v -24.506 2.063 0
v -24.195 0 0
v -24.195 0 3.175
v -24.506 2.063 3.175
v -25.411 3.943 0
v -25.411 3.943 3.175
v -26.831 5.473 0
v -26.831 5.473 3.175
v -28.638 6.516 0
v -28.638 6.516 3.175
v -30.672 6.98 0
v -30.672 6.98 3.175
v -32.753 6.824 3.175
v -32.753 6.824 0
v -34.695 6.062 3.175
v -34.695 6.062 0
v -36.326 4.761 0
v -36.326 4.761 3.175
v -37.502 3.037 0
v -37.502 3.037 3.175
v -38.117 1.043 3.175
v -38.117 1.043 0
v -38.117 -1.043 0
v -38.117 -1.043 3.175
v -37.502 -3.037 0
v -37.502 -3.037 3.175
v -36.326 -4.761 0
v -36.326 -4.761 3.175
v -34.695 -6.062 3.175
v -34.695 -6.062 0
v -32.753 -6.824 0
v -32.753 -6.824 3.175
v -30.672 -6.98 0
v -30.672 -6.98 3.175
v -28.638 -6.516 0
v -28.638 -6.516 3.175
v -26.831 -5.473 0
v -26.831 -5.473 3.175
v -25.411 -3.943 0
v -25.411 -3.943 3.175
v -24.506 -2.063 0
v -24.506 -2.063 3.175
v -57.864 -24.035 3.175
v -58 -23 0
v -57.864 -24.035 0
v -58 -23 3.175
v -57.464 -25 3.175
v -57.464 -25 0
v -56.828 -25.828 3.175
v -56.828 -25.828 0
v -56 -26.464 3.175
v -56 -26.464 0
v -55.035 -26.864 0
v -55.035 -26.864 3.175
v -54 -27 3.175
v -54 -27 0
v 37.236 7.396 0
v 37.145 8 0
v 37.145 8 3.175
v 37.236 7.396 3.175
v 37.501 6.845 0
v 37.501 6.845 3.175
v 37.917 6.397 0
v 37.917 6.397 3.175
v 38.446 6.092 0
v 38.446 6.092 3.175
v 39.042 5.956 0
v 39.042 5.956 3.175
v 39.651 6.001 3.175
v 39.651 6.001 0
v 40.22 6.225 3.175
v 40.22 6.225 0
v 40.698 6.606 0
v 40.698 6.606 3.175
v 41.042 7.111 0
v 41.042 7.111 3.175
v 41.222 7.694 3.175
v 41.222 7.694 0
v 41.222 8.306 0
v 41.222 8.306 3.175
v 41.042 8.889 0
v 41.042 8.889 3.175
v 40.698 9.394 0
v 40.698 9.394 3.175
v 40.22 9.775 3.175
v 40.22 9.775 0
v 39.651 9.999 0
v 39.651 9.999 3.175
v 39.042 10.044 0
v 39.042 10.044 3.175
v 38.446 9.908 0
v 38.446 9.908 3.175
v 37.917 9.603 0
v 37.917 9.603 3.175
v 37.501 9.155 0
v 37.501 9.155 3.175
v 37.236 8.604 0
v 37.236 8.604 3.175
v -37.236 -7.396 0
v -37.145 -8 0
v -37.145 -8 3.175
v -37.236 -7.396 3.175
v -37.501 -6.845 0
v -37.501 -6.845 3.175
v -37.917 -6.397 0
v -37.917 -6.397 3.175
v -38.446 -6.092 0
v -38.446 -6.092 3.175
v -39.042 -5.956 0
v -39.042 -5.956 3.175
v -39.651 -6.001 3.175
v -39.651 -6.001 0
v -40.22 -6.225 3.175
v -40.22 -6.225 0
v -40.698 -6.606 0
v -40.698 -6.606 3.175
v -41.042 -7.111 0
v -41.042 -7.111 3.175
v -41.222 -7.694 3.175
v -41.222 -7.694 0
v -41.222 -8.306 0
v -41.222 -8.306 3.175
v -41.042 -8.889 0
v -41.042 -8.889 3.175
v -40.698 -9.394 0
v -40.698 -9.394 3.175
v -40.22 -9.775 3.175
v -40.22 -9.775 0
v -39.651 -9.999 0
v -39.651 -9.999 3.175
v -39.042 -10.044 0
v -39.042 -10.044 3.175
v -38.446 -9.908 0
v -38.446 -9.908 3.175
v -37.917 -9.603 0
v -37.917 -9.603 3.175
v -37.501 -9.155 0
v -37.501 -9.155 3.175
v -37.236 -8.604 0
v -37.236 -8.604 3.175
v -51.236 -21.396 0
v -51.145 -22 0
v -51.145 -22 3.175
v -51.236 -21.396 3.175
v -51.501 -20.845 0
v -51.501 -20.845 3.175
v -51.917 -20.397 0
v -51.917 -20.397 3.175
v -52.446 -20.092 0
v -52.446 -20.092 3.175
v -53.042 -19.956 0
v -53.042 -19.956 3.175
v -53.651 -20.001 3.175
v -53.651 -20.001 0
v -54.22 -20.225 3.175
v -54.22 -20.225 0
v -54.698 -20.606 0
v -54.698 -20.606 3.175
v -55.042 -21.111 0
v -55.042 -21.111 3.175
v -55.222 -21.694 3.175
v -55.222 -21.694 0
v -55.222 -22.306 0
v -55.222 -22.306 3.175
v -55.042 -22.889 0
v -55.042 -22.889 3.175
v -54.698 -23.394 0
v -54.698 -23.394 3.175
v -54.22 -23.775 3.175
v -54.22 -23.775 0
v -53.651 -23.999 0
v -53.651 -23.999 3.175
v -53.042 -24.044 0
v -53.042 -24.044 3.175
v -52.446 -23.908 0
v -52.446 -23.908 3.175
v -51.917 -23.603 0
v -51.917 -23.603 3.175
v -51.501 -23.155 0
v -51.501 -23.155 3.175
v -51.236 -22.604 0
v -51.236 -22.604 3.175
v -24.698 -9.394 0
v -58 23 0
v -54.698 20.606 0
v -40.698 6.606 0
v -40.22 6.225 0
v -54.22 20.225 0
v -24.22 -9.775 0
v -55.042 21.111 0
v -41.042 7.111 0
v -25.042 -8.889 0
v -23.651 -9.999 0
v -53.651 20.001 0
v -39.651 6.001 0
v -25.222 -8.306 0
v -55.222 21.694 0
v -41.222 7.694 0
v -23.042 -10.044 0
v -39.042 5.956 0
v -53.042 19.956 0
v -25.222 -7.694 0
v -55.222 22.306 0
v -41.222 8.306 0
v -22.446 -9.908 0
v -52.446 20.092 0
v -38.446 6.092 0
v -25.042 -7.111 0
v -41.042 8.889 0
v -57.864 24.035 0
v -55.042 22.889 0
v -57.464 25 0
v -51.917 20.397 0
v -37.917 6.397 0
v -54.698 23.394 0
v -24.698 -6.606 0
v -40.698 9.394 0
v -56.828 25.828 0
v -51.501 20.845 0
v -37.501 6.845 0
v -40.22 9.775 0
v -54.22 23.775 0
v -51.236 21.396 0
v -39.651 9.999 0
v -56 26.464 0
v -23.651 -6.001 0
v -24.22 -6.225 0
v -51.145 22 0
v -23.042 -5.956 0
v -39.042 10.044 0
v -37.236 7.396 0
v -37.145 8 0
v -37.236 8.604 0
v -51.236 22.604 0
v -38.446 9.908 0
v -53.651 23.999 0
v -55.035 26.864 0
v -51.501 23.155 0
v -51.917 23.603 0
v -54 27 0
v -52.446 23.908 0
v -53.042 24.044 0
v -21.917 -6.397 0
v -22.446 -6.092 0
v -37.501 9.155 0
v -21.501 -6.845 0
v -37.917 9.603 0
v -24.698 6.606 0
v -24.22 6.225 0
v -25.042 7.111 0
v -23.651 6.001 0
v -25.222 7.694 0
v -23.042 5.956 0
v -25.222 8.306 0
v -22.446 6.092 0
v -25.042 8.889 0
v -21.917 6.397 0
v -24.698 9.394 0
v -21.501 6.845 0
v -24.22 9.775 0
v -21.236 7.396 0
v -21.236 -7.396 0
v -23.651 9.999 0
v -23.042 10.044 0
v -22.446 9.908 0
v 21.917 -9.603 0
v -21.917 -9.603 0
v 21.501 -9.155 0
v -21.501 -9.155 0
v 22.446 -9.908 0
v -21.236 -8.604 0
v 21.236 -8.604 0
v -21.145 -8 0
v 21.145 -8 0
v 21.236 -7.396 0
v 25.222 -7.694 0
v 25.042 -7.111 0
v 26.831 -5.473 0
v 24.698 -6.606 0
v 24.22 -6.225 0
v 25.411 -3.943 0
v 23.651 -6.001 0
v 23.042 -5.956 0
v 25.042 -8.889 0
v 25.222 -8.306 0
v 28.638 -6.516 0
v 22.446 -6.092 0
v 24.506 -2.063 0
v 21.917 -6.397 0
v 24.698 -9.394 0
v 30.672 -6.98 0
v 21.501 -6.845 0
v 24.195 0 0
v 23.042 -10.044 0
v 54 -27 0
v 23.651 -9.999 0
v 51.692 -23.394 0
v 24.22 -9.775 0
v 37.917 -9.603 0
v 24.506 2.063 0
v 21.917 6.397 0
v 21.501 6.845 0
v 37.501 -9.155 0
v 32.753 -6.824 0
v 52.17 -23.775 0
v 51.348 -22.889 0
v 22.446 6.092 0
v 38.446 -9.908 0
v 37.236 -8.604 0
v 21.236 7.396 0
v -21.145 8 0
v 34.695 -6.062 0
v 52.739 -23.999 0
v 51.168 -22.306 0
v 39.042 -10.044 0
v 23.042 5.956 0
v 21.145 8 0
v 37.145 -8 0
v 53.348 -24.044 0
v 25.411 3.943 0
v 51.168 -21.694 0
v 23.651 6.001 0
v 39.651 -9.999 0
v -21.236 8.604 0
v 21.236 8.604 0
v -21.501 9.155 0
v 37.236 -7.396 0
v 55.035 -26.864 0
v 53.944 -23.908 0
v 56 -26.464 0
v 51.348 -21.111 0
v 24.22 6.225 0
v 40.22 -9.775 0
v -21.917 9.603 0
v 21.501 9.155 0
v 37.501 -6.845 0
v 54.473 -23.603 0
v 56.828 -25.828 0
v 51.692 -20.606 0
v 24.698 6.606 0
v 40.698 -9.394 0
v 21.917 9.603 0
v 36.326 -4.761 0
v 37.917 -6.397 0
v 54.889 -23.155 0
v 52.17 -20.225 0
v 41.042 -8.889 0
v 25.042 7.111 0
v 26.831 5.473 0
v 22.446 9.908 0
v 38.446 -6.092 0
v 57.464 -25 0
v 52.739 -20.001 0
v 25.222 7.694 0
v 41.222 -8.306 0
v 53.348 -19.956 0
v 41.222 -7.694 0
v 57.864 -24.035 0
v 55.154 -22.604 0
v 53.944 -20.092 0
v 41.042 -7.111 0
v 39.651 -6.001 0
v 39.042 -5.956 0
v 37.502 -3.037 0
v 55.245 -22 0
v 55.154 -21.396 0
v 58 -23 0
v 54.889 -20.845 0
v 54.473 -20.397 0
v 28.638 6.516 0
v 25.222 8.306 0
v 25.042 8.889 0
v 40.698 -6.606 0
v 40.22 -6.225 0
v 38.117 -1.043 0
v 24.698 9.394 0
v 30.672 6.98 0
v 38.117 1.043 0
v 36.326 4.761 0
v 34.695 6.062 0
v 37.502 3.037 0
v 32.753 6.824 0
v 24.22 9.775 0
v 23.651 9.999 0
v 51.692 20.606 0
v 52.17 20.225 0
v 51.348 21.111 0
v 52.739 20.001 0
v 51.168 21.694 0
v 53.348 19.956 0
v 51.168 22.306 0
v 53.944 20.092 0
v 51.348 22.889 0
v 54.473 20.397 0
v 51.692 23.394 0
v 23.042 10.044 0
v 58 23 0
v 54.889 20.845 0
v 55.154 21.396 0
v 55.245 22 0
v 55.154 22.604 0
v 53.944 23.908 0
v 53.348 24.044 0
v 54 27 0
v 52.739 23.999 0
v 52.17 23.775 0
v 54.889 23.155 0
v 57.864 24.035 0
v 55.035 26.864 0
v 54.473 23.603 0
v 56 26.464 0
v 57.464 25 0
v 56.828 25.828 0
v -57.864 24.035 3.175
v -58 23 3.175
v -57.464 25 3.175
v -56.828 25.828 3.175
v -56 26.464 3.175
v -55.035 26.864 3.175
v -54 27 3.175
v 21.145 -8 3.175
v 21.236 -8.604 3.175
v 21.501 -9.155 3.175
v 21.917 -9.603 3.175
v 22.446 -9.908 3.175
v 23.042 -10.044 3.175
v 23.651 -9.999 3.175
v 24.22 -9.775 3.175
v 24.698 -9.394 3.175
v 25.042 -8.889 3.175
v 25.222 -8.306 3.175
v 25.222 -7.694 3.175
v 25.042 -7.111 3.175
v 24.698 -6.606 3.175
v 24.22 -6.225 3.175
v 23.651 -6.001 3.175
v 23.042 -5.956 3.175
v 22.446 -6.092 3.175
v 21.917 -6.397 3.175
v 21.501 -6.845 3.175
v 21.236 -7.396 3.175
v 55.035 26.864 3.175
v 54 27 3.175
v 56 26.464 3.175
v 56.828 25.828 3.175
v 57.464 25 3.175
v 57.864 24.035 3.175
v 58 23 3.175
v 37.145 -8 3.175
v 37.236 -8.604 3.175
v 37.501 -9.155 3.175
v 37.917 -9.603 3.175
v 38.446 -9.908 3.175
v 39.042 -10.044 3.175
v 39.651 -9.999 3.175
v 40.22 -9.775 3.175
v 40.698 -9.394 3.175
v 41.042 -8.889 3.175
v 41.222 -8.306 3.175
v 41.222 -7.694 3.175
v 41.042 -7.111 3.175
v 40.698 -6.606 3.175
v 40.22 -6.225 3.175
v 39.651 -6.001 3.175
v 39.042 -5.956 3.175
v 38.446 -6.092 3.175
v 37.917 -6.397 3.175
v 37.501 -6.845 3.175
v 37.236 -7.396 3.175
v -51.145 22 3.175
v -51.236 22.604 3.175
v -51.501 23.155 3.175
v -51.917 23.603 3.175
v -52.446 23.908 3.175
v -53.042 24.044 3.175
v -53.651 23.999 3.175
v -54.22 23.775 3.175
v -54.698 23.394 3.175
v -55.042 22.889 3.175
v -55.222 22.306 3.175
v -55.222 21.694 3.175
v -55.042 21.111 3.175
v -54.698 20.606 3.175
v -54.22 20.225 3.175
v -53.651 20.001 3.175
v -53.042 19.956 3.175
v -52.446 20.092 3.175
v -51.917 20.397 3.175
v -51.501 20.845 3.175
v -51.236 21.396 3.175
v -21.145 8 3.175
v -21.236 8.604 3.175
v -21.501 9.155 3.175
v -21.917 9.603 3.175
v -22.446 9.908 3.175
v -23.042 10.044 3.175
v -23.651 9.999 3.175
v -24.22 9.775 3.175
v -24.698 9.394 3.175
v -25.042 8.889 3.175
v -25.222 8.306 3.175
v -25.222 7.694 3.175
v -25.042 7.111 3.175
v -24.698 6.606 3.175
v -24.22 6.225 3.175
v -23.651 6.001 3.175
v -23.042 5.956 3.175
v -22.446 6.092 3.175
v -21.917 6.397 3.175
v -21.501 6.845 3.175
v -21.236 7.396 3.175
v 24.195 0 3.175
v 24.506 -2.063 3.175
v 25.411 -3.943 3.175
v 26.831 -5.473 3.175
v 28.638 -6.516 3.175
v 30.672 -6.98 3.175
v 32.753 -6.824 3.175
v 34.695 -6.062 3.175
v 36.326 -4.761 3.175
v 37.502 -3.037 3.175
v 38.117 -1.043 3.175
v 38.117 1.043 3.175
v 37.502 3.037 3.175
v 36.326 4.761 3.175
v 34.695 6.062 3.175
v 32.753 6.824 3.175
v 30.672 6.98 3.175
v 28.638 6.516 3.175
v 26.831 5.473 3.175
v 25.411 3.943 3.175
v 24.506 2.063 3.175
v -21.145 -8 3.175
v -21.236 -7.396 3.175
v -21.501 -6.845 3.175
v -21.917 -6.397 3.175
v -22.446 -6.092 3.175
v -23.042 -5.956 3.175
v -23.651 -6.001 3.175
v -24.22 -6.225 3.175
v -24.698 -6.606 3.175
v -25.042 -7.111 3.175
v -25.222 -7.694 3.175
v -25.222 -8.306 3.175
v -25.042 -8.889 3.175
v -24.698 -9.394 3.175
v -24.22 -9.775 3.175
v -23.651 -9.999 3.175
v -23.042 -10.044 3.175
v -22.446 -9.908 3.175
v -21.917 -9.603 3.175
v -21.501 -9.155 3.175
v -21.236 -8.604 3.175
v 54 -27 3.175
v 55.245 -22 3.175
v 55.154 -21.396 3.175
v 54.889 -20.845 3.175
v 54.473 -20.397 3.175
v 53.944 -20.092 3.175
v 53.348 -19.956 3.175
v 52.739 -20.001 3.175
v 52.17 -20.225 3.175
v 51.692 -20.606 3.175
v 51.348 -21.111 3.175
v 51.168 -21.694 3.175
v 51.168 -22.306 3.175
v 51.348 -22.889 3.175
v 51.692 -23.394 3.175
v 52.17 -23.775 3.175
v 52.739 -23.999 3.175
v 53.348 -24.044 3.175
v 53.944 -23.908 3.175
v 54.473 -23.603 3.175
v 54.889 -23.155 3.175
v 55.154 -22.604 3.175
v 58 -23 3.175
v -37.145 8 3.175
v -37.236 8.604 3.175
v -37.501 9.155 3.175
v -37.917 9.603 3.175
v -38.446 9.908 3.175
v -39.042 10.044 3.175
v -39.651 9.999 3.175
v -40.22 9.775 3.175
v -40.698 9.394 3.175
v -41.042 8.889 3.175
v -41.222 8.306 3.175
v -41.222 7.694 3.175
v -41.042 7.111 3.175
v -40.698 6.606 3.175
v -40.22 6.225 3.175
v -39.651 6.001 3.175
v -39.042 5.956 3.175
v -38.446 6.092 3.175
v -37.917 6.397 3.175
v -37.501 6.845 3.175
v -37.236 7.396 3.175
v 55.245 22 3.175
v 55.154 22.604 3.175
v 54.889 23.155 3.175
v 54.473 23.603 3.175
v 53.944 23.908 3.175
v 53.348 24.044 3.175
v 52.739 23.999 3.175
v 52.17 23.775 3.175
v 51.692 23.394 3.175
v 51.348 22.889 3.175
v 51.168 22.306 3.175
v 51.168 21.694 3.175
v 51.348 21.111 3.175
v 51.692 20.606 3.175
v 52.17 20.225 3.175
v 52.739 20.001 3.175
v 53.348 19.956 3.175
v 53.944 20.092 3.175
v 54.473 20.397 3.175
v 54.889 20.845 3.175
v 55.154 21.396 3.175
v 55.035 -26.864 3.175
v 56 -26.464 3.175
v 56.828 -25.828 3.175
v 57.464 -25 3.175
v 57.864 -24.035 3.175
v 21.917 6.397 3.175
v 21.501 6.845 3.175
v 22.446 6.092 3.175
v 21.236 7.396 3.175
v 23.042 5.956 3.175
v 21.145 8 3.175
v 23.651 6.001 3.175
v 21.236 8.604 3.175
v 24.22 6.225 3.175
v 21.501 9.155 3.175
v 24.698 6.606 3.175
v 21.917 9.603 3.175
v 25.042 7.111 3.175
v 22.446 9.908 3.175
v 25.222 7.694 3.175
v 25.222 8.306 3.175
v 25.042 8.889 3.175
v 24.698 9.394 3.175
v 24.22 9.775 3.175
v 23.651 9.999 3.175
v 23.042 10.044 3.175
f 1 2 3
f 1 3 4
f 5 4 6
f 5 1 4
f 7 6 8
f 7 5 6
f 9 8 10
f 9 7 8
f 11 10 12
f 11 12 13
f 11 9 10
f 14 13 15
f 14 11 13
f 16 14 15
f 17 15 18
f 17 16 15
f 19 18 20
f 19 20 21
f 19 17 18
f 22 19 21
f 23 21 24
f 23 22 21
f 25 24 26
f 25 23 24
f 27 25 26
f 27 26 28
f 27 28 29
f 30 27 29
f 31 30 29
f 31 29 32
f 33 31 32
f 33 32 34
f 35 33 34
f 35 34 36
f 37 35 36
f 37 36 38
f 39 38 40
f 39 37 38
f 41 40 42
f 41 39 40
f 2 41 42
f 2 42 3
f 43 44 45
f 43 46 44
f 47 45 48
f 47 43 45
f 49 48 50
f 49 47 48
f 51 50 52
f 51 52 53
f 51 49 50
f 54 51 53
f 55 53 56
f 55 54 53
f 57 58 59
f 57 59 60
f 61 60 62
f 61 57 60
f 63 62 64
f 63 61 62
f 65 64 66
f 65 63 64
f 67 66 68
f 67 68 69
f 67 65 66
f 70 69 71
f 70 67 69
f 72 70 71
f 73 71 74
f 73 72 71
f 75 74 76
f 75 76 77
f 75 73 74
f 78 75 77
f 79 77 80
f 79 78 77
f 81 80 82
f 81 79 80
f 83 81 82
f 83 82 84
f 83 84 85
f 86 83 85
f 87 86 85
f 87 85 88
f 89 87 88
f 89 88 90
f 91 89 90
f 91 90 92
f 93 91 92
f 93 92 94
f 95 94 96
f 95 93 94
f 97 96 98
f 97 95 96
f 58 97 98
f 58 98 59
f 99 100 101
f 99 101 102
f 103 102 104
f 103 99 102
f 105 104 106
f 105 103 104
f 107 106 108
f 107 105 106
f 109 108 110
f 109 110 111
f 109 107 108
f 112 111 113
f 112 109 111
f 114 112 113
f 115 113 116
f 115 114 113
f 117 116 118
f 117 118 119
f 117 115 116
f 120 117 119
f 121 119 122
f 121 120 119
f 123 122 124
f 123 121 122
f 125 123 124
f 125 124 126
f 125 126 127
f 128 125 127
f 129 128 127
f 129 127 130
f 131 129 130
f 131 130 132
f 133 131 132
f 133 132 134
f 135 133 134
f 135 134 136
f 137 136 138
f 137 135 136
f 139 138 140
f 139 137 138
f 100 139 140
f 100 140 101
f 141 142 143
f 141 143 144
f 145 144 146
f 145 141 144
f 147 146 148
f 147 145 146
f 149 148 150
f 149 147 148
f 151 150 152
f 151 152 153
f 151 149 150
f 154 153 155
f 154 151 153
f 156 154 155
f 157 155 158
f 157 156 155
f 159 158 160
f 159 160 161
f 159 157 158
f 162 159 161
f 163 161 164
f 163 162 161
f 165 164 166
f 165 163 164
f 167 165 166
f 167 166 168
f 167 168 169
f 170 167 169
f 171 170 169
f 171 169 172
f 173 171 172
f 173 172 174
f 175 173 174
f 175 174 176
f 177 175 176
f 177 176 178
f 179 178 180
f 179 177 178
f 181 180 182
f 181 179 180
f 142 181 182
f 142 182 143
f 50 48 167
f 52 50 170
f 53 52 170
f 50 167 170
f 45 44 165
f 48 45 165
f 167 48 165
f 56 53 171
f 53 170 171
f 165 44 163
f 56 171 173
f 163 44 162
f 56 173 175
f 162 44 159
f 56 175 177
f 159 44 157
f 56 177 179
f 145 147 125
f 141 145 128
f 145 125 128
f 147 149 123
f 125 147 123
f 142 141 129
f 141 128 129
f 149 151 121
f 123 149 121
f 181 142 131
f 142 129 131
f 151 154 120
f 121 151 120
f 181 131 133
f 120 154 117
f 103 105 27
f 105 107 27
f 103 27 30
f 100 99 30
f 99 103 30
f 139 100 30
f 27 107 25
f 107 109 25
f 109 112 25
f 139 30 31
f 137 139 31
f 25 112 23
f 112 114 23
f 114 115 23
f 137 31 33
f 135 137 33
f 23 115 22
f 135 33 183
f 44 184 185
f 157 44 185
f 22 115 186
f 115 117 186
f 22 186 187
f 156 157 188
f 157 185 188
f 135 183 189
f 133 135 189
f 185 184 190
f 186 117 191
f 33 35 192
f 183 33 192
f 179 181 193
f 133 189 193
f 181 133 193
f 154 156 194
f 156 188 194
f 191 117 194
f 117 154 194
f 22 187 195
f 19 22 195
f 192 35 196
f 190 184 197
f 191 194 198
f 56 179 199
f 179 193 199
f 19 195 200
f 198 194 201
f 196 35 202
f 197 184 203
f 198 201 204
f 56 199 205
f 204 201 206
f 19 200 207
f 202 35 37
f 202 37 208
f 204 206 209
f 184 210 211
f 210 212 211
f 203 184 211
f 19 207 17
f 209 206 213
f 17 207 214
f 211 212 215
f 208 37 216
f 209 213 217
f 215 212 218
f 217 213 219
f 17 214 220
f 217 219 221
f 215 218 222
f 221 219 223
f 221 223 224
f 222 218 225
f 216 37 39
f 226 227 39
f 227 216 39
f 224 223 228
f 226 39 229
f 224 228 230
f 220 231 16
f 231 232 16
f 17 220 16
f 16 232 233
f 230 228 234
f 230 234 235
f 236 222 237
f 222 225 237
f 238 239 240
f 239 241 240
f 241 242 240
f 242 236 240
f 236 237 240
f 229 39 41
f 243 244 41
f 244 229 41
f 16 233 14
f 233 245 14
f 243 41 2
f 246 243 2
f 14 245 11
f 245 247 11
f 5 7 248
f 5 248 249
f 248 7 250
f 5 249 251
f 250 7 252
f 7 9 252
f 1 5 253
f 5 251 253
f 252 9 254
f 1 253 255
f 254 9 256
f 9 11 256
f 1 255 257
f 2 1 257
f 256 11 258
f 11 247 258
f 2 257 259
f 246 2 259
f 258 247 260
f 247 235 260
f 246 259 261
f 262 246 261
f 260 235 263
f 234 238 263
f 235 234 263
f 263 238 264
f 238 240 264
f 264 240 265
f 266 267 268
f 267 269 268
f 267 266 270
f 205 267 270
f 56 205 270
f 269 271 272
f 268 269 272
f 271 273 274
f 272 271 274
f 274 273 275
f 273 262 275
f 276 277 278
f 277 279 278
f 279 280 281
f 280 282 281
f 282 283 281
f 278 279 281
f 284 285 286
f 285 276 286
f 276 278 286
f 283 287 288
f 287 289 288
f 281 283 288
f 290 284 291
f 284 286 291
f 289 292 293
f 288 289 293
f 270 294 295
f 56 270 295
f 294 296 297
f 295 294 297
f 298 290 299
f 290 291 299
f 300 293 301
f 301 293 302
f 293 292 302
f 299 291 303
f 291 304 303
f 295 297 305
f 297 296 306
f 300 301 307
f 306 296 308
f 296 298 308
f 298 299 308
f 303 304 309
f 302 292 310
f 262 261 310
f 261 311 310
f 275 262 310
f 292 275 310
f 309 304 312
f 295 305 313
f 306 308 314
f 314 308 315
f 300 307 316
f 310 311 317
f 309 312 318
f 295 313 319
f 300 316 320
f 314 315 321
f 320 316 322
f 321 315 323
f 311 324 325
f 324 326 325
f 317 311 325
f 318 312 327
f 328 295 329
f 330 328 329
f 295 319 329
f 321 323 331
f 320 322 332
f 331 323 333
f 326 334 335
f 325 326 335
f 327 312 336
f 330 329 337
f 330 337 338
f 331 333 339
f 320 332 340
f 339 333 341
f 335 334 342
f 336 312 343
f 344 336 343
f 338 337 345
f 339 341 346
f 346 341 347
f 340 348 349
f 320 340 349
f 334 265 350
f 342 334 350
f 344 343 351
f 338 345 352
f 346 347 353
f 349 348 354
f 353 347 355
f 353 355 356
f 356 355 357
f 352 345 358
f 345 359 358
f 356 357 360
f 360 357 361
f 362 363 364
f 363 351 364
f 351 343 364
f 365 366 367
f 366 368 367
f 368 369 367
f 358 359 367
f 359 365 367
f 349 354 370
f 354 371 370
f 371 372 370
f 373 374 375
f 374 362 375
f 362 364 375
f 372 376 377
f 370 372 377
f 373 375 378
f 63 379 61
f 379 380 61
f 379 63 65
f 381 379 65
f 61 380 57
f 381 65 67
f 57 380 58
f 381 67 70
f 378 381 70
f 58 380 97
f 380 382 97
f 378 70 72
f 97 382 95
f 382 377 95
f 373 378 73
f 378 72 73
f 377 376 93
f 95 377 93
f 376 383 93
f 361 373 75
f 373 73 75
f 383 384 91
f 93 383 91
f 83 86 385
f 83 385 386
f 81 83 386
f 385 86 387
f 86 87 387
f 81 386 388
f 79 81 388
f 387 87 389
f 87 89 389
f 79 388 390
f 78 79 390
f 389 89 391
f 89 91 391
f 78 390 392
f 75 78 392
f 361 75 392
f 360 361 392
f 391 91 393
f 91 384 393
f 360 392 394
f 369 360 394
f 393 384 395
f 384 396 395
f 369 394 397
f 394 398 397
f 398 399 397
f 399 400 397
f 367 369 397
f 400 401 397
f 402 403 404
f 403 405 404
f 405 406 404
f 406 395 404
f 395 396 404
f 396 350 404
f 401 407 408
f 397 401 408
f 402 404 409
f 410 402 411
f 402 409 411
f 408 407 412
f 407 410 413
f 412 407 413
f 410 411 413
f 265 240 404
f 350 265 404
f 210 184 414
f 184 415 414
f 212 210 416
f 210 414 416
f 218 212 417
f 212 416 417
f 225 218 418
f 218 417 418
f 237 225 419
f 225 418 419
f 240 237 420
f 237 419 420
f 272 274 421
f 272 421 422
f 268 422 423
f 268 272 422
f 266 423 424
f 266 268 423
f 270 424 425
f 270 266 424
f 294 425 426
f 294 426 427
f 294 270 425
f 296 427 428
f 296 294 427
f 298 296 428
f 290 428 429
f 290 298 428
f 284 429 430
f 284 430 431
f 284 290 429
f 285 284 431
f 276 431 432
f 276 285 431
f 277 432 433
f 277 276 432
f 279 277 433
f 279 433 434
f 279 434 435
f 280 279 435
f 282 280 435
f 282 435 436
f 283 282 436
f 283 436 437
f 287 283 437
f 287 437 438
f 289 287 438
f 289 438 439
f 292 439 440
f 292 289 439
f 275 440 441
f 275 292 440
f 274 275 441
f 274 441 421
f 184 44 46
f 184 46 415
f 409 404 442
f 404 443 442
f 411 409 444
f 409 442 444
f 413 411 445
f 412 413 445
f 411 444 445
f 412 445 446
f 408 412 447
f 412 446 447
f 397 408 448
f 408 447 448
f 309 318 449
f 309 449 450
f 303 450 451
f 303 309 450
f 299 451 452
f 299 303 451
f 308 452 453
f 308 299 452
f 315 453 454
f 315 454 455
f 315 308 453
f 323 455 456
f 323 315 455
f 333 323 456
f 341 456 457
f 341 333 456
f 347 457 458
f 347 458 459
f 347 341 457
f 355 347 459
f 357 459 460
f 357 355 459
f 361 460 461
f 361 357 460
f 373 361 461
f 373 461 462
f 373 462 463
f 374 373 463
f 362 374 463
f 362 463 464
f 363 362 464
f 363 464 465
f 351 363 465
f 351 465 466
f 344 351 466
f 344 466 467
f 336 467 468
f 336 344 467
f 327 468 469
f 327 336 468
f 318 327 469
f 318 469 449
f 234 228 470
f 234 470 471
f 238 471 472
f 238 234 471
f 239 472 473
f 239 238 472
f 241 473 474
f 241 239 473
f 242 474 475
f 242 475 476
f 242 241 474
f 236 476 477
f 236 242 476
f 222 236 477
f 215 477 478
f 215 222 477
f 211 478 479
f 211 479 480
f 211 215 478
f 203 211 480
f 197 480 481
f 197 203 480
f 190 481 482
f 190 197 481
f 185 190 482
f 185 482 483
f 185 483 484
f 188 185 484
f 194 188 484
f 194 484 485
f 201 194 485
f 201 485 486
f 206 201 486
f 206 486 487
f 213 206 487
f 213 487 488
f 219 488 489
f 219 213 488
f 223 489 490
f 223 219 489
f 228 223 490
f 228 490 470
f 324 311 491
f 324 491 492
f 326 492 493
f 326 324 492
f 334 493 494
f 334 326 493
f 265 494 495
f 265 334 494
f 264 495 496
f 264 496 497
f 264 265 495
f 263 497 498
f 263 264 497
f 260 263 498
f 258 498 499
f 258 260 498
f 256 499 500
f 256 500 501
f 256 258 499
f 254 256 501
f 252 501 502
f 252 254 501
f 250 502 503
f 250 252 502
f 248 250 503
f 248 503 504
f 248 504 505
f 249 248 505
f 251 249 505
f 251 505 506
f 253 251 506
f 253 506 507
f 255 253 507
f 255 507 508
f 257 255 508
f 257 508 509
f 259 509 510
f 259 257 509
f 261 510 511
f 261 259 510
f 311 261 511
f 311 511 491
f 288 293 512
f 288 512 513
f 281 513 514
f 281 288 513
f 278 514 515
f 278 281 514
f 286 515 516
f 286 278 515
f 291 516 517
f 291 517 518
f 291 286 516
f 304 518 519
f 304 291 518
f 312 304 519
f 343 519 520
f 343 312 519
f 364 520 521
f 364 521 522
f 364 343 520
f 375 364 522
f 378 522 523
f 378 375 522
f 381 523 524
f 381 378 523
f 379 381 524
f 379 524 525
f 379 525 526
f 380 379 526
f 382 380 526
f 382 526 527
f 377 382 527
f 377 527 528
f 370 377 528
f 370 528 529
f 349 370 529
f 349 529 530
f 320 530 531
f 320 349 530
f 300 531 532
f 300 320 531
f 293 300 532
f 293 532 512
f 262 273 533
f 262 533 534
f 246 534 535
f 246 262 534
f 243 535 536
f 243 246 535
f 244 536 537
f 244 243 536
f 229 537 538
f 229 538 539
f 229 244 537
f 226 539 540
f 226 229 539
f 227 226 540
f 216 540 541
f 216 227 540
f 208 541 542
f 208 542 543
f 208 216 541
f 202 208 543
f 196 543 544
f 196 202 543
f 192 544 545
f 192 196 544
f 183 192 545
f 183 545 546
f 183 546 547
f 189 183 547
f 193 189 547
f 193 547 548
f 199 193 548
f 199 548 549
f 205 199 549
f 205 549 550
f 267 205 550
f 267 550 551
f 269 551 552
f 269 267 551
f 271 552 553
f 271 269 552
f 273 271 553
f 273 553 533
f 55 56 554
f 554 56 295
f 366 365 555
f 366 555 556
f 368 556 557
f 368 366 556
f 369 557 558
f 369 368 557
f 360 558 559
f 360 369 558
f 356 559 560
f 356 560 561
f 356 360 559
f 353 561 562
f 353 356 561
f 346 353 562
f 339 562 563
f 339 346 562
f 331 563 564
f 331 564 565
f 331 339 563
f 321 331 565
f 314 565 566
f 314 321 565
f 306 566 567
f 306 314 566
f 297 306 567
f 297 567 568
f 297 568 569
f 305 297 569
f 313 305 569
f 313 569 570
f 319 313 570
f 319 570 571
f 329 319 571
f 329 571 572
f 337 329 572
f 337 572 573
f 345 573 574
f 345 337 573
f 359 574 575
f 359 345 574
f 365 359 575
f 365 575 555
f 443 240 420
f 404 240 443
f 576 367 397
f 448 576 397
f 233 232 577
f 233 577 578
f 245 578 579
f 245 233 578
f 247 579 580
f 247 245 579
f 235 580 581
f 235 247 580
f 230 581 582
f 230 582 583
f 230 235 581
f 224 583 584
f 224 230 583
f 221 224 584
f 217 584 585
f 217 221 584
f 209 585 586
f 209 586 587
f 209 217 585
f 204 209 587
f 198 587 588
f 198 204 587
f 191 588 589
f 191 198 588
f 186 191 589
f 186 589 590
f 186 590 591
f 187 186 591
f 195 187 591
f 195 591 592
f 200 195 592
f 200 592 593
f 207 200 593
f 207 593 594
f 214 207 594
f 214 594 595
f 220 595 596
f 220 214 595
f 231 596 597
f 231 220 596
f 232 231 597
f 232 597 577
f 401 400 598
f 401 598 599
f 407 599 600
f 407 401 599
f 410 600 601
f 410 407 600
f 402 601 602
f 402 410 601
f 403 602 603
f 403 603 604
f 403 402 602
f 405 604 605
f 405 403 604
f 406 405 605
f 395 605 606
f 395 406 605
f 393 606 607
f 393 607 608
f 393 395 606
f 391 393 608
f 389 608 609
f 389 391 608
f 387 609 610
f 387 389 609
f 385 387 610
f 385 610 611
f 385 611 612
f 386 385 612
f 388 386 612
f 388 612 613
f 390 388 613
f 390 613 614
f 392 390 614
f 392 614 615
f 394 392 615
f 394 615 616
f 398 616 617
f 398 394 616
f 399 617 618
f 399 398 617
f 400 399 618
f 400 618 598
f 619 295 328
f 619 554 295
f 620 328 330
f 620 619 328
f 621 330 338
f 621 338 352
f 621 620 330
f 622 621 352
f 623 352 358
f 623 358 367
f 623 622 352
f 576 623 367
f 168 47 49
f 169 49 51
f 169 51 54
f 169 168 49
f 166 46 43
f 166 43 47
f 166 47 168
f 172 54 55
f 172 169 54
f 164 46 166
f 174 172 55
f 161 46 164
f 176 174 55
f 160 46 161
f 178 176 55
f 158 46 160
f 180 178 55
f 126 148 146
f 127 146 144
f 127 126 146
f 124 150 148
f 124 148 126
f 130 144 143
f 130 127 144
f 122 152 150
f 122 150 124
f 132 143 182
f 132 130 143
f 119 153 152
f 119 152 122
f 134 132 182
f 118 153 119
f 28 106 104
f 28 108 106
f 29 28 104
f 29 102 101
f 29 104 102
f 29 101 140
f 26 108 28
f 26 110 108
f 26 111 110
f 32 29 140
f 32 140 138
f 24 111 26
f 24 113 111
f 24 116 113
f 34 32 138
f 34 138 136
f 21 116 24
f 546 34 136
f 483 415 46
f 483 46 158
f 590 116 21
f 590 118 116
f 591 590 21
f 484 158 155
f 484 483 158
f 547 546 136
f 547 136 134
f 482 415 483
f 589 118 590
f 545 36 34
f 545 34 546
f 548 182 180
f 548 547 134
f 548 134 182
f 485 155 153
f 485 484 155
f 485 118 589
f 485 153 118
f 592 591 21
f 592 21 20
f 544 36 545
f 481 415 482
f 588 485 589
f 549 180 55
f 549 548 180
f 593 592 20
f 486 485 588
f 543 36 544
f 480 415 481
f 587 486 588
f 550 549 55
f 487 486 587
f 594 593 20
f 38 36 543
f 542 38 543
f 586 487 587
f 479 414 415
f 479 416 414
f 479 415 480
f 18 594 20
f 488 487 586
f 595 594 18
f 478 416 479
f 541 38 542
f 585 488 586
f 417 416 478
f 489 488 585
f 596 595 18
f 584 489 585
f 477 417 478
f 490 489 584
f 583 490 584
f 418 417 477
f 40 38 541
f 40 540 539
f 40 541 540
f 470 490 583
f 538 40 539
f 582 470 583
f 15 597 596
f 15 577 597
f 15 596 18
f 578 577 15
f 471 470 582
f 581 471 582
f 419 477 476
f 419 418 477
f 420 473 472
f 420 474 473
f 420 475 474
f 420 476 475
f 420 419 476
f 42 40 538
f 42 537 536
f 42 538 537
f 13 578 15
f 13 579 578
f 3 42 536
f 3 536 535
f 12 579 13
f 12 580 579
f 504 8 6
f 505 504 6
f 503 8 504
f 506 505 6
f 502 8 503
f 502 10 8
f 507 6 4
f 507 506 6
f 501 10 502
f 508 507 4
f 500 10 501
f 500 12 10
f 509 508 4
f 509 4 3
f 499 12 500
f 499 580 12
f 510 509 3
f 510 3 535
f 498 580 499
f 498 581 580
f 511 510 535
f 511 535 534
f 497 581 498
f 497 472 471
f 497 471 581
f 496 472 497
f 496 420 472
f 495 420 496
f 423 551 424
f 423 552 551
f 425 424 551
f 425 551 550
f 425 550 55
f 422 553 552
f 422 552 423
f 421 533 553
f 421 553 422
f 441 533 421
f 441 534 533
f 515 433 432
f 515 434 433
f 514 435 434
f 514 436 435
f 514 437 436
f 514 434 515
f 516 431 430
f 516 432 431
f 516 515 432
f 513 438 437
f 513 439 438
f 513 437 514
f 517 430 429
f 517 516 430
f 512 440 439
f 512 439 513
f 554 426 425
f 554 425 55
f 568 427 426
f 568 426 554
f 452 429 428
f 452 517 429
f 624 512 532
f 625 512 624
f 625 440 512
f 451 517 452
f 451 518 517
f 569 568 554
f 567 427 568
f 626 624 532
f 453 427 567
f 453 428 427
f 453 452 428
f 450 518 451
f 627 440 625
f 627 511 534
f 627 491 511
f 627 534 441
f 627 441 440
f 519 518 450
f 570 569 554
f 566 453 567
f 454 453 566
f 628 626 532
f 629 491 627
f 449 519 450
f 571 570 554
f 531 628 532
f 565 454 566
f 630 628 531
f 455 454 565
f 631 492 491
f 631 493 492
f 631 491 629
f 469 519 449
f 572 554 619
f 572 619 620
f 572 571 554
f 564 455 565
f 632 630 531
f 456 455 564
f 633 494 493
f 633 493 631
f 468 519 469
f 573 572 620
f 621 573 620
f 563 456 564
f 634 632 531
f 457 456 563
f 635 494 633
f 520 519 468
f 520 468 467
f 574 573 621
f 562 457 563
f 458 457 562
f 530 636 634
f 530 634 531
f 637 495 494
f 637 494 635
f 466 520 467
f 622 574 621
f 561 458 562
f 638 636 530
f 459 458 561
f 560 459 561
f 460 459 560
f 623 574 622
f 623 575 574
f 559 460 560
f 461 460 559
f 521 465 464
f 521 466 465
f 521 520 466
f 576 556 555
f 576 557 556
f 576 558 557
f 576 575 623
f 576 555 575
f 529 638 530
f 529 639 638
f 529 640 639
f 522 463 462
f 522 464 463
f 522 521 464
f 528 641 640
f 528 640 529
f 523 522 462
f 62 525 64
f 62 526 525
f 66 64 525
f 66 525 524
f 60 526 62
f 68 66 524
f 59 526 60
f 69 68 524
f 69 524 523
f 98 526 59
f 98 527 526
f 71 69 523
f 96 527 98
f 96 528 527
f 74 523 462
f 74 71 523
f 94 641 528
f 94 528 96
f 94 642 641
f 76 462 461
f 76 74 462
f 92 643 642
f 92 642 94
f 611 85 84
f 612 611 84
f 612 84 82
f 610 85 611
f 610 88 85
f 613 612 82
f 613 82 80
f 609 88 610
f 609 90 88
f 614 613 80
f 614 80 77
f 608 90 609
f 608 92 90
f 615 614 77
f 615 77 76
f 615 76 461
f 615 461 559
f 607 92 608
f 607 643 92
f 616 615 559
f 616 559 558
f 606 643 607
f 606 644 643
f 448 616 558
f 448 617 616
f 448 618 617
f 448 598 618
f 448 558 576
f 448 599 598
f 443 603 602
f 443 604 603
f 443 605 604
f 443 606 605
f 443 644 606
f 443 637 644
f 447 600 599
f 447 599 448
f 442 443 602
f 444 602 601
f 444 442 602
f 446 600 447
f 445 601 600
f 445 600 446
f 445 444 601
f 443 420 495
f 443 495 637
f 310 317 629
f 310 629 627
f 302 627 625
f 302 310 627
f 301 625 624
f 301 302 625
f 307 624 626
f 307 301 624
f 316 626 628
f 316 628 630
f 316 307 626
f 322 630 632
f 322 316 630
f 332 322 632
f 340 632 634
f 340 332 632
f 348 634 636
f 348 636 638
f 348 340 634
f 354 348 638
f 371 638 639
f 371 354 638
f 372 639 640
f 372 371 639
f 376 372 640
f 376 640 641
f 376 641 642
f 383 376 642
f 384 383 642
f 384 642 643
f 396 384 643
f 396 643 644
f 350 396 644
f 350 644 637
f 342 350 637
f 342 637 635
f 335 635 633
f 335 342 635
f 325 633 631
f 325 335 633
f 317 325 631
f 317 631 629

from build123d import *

# Parameters (mm, degrees)
SKETCH1_W           = 116
SKETCH1_H           = 54
SKETCH1_R           = 2.05
SKETCH1_R_2         = 7
BOSS_EXTRUDE1_DEPTH = 3.175
FILLET1_R           = 4


with BuildPart() as part:
    # Sketch1 → Boss-Extrude1 (new body)
    with BuildSketch(Plane.XY):
        Rectangle(SKETCH1_W, SKETCH1_H)
        with Locations((-53.195, 22)):
            Circle(SKETCH1_R, mode=Mode.SUBTRACT)
        with Locations((53.195, 22)):
            Circle(SKETCH1_R, mode=Mode.SUBTRACT)
        with Locations((53.195, -22)):
            Circle(SKETCH1_R, mode=Mode.SUBTRACT)
        with Locations((-53.195, -22)):
            Circle(SKETCH1_R, mode=Mode.SUBTRACT)
        with Locations((-39.195, 8)):
            Circle(SKETCH1_R, mode=Mode.SUBTRACT)
        with Locations((-23.195, 8)):
            Circle(SKETCH1_R, mode=Mode.SUBTRACT)
        with Locations((-23.195, -8)):
            Circle(SKETCH1_R, mode=Mode.SUBTRACT)
        with Locations((-39.195, -8)):
            Circle(SKETCH1_R, mode=Mode.SUBTRACT)
        with Locations((-31.195, 0)):
            Circle(SKETCH1_R_2, mode=Mode.SUBTRACT)
        with Locations(Location((39.195, -8, 0), (0, 0, 180))):
            Circle(SKETCH1_R, mode=Mode.SUBTRACT)
        with Locations(Location((39.195, 8, 0), (0, 0, 180))):
            Circle(SKETCH1_R, mode=Mode.SUBTRACT)
        with Locations(Location((23.195, 8, 0), (0, 0, 180))):
            Circle(SKETCH1_R, mode=Mode.SUBTRACT)
        with Locations(Location((31.195, 0, 0), (0, 0, 180))):
            Circle(SKETCH1_R_2, mode=Mode.SUBTRACT)
        with Locations(Location((23.195, -8, 0), (0, 0, 180))):
            Circle(SKETCH1_R, mode=Mode.SUBTRACT)
    extrude(amount=BOSS_EXTRUDE1_DEPTH)

    # Fillet1
    fillet1_edges = [part.edges().sort_by_distance(p)[0] for p in [
        (-58, 27, 1.5875),
        (58, 27, 1.5875),
        (58, -27, 1.5875),
        (-58, -27, 1.5875),
    ]]
    fillet(fillet1_edges, radius=FILLET1_R)


solid = part.part
